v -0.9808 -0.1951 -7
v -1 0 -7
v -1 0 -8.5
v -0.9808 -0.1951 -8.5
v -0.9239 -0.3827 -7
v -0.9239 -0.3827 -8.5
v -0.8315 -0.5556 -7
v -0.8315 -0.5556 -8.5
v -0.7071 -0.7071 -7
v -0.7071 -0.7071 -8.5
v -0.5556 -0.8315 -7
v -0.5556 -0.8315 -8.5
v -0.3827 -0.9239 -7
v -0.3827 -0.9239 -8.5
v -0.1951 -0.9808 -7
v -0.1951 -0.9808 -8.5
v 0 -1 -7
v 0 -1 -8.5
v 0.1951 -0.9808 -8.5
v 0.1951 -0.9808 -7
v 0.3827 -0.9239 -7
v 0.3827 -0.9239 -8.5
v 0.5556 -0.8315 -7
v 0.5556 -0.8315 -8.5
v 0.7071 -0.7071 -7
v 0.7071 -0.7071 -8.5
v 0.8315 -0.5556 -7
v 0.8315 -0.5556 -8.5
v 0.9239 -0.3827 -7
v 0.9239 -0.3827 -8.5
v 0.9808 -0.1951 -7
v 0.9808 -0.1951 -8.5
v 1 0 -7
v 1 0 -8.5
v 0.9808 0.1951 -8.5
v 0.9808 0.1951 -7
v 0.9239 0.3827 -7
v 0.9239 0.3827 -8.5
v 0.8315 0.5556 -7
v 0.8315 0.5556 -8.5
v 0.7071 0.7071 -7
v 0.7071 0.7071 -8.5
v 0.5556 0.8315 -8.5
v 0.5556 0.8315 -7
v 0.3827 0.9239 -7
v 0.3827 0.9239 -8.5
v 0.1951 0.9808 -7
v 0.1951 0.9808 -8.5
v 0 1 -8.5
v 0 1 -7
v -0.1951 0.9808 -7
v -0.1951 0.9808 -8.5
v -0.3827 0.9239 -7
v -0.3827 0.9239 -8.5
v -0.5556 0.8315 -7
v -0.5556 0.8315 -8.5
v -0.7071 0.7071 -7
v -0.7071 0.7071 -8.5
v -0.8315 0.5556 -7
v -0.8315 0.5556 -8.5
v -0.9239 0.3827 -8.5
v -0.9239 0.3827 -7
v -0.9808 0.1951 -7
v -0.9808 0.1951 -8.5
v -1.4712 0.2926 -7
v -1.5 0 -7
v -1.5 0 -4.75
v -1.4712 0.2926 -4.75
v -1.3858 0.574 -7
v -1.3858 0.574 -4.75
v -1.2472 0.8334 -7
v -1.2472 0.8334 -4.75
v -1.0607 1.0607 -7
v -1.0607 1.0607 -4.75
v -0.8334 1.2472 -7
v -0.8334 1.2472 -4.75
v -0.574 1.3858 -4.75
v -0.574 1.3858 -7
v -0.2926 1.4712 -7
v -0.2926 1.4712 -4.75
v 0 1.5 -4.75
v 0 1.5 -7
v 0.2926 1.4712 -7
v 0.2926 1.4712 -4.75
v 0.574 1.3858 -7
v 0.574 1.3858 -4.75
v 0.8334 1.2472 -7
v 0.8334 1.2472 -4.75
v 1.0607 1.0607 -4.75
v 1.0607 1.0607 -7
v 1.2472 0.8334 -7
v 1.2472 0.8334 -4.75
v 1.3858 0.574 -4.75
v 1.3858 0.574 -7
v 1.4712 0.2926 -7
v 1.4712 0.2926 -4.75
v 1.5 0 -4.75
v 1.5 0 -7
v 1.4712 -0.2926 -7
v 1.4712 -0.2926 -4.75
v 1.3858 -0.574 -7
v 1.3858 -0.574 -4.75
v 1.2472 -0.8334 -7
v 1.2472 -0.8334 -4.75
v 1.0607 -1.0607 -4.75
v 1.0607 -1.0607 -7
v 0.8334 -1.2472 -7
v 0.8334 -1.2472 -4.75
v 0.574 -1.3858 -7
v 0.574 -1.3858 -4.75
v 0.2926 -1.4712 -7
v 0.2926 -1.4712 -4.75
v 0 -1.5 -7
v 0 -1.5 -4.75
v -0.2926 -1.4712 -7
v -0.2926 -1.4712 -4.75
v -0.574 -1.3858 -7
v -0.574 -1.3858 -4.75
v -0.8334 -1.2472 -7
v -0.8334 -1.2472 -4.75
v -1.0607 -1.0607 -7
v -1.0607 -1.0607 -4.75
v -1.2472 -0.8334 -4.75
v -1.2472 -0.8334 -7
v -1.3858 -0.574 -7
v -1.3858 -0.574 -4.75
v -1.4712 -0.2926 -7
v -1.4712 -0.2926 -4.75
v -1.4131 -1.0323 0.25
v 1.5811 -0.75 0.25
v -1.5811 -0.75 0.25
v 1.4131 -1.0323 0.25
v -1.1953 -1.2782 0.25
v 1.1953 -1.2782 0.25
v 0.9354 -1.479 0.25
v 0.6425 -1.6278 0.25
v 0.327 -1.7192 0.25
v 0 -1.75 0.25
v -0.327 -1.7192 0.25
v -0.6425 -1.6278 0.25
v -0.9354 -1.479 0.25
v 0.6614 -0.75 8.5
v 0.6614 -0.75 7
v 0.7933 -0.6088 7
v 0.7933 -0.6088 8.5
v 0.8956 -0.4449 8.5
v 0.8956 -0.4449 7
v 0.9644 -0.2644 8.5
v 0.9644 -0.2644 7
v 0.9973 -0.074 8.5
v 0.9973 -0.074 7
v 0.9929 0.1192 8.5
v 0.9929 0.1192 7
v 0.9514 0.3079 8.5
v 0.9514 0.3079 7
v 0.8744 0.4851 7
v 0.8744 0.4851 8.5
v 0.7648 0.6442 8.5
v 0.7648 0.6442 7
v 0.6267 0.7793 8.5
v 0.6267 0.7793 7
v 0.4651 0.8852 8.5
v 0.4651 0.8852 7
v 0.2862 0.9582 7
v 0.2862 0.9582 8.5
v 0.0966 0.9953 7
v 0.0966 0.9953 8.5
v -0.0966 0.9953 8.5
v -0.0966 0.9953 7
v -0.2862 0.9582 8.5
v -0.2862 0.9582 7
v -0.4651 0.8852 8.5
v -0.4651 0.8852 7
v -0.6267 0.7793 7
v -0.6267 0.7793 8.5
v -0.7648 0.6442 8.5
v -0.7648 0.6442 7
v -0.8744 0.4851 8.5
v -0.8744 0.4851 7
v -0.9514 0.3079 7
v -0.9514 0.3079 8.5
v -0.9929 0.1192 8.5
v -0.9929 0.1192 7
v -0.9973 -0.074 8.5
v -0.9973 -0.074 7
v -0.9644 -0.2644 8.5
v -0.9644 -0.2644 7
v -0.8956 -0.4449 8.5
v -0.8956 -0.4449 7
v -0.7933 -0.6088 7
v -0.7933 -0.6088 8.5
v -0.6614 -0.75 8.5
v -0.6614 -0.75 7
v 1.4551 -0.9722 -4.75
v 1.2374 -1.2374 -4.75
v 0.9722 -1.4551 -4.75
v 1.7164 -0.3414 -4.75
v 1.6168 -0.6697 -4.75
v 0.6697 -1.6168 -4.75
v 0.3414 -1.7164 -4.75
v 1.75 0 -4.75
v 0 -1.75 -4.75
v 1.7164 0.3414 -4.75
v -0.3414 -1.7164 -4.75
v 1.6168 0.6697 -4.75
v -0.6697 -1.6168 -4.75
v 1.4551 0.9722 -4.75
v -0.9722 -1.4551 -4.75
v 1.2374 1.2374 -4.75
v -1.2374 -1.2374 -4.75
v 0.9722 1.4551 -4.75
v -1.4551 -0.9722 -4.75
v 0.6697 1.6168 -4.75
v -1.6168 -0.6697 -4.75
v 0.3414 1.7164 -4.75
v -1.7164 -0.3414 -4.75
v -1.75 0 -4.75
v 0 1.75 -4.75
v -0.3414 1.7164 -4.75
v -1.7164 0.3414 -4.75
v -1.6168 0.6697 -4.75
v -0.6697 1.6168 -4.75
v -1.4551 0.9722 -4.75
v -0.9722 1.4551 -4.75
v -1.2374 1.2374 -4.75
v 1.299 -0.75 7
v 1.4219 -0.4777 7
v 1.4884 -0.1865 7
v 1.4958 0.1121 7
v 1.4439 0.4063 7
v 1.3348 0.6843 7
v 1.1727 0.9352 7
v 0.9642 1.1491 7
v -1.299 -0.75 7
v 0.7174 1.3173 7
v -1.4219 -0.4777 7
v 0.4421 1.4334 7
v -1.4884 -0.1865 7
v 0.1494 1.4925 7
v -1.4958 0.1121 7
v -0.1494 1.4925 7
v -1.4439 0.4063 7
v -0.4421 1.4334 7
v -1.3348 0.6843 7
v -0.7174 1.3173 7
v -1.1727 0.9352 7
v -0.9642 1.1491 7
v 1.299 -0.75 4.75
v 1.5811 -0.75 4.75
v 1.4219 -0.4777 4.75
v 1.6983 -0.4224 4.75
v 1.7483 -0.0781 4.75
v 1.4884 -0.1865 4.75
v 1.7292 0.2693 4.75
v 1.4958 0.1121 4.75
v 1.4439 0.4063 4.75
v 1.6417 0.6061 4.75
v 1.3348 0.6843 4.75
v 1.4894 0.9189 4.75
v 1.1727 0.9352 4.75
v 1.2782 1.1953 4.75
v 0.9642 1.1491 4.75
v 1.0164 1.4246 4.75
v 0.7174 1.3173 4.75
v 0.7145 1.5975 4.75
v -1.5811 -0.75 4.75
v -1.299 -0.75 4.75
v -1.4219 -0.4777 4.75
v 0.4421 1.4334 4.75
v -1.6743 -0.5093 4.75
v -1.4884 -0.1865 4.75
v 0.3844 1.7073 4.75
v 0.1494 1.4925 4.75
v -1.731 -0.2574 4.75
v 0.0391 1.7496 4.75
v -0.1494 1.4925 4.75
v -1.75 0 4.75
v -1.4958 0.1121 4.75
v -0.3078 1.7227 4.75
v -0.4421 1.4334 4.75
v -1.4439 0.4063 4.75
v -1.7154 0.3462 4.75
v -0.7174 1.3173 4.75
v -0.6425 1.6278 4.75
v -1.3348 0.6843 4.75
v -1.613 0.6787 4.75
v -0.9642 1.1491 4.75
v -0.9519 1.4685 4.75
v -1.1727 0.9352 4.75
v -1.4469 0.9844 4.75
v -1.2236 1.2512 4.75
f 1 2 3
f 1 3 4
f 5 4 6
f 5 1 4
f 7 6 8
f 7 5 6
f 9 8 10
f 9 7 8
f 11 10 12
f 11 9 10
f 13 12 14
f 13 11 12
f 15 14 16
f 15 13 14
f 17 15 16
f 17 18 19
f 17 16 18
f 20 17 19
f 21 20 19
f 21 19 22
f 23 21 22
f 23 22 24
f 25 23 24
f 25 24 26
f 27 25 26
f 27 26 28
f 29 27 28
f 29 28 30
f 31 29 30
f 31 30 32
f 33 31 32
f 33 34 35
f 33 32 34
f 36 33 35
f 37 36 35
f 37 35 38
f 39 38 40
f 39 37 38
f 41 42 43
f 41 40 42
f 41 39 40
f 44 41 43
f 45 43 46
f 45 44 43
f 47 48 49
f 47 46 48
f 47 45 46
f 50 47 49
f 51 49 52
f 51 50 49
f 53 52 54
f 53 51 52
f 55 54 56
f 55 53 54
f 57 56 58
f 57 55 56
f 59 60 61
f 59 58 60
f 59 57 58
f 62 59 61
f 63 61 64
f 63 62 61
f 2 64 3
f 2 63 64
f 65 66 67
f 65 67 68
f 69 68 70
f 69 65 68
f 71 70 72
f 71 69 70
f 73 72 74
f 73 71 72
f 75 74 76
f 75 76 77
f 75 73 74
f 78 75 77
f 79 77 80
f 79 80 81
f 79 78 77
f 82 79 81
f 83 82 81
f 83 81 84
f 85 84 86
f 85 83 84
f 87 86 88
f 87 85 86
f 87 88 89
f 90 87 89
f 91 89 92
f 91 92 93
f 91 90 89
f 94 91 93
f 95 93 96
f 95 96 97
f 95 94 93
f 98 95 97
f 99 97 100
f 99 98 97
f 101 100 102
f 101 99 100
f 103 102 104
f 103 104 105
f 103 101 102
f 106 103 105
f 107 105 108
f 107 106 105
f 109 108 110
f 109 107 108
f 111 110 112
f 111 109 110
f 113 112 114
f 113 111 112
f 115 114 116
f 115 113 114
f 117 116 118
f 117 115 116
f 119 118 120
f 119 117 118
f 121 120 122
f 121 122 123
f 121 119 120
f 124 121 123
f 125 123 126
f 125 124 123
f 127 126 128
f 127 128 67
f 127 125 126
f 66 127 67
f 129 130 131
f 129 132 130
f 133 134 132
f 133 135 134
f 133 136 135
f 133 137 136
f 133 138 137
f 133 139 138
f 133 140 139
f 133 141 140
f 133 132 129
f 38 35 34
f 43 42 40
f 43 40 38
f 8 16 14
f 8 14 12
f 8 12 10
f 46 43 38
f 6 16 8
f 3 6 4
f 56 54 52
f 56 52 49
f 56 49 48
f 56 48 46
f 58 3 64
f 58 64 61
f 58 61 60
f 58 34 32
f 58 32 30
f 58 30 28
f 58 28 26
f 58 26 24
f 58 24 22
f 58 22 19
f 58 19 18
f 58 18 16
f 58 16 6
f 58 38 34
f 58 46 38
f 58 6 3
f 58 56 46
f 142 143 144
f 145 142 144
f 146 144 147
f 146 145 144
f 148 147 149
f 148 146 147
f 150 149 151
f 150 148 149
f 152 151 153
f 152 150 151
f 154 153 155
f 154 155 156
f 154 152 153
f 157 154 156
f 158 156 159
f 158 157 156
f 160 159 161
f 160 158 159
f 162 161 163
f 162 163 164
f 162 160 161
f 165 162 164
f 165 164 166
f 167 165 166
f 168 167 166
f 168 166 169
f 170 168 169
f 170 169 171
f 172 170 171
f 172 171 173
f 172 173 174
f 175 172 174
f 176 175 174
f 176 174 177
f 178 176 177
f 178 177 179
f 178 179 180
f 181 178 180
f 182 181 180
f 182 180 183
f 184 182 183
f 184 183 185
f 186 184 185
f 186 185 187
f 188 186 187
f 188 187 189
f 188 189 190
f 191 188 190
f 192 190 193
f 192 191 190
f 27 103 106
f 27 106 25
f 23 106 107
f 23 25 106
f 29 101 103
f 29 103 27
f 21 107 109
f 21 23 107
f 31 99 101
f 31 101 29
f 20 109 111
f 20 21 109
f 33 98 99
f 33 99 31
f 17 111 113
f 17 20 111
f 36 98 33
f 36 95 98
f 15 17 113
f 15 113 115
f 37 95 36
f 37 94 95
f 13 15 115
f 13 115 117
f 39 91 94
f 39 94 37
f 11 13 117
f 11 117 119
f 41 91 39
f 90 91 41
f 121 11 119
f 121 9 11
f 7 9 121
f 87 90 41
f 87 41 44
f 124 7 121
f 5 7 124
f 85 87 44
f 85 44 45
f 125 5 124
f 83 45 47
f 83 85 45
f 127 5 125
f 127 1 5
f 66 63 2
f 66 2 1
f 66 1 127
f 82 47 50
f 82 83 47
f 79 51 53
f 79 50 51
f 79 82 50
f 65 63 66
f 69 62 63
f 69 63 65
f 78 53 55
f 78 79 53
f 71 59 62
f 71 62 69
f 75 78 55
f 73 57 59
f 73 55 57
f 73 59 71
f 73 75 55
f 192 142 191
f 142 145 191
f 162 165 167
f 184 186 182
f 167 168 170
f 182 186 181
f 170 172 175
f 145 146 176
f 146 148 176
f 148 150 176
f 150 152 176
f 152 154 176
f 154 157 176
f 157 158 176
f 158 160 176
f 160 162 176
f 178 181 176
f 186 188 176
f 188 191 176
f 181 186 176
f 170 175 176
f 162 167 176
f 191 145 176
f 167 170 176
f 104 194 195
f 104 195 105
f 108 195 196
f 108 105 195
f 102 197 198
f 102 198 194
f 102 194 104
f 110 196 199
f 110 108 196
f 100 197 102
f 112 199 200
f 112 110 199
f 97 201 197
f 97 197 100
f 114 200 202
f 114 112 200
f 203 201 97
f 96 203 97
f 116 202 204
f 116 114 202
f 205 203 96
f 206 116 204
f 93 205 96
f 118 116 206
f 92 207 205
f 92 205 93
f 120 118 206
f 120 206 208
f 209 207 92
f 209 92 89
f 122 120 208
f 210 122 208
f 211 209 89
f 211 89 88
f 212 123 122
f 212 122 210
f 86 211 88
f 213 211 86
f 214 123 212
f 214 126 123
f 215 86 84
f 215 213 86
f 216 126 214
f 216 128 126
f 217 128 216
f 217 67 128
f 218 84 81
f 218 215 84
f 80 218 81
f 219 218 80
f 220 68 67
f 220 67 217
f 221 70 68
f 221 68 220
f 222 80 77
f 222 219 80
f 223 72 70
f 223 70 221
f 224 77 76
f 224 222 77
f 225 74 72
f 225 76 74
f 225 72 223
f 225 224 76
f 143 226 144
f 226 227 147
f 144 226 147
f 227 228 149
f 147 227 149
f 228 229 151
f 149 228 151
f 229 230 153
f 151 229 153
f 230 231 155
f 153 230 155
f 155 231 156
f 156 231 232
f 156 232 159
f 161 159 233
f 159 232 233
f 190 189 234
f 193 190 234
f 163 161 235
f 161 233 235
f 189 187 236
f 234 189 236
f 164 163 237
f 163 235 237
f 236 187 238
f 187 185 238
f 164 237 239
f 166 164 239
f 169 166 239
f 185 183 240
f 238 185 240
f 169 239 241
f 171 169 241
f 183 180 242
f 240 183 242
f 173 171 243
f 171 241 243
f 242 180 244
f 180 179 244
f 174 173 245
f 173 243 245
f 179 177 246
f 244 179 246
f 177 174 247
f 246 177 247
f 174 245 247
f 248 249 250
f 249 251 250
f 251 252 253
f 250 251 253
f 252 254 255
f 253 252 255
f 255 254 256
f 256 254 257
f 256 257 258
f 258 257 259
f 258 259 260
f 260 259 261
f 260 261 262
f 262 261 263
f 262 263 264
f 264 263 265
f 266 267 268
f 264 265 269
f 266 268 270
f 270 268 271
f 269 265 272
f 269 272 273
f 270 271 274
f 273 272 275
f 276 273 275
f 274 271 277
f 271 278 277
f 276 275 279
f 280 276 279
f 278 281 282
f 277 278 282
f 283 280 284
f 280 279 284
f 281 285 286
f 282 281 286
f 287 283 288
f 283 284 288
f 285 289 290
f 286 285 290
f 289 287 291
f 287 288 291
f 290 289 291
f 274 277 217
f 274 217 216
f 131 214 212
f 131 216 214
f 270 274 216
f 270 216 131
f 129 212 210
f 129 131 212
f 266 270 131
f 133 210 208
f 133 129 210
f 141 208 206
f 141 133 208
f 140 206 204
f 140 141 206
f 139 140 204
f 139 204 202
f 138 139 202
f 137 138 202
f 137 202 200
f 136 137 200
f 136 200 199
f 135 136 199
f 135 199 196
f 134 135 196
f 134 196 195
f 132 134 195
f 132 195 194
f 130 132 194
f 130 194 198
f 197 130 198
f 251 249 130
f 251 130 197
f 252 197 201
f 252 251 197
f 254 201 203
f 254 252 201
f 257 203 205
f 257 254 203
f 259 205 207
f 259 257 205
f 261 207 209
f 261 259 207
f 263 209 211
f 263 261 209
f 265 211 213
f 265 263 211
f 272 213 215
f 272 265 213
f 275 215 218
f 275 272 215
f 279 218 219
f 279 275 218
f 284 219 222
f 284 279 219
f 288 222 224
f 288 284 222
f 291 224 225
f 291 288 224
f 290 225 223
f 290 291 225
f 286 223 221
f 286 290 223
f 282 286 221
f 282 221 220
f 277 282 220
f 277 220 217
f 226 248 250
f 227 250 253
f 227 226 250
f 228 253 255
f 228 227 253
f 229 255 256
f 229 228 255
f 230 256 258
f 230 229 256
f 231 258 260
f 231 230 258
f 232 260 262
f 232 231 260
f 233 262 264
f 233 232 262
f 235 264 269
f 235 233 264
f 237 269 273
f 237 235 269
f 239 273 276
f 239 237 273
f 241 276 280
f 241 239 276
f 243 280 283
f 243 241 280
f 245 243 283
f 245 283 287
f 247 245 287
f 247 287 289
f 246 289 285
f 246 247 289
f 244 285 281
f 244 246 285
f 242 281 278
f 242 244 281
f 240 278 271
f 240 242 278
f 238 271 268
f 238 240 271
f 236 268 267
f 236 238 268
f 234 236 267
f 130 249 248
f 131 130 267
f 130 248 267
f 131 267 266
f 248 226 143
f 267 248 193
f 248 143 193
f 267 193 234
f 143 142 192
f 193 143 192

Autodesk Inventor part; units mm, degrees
ref_plane "YZ Plane" through (0, 0, 0) normal (1, 0, 0) x (0, 1, 0)
ref_plane "XY Plane" through (0, 0, 0) normal (0, 0, 1) x (1, 0, 0)
sketch "Sketch1" plane through (0, 0, 0) normal (0, 1, 0) x (-1, 0, 0)
  line L0 (0, 18.1135) -> (0, -15.5197) construction
  line L1 (0, 0) -> (5.9379, 0) construction
  line L2 (0, -8.5) -> (1, -8.5)
  line L3 (1, -8.5) -> (1, -7)
  line L4 (1, -7) -> (1.1561, -7)
  line L5 (1.5, -4.75) -> (1.75, -4.75)
  line L6 (1.75, -4.75) -> (1.75, 4.75)
  line L7 (1.75, 4.75) -> (1.5, 4.75)
  line L8 (1.5, 4.75) -> (1.5, 7)
  line L9 (1.5, 7) -> (1, 7)
  line L10 (1, 7) -> (1, 8.5)
  line L11 (1, 8.5) -> (0, 8.5)
  line L12 (0, -8.5) -> (0, 8.5)
  line L13 (1.5, -4.75) -> (1.5, -7)
  line L14 (1.5, -7) -> (1.1561, -7)
  dimension "d7" = 17
  dimension "d9" = 1
  dimension "d10" = 1.5
  dimension "d11" = 14
  dimension "d12" = 1.75
  dimension "d13" = 9.5
revolve "Revolution1" add sketch "Sketch1" angle 360 about axis through (0, 0, 18.1135) along (0, 0, -1)
ref_plane "Work Plane1" through (0, -1.75, 0) normal (0, 1, 0) x (-1, 0, 0)
sketch "Sketch2" plane through (0, -1.75, 0) normal (0, 1, 0) x (-1, 0, 0)
  line L0 (-1.75, -4.75) -> (1.75, -4.75) projected
  line L1 (-1.75, 4.75) -> (1.75, 4.75) projected
  line L2 (-1.75, -4.75) -> (1.75, -4.75) projected
  line L3 (-1.75, 4.75) -> (-1.75, -4.75) projected
  line L4 (1.75, 4.75) -> (1.75, -4.75) projected
  line L5 (-1.75, 0.25) -> (1.75, 0.25)
  line L6 (1.75, 0.25) -> (1.75, 8.5)
  line L7 (-1.75, 8.5) -> (-1.75, 0.25)
  line L8 (-1.5, 7) -> (1.5, 7) projected
  line L9 (-1.5, 4.75) -> (1.5, 4.75) projected
  line L10 (-1, 8.5) -> (1, 8.5) projected
  line L11 (-1.75, 8.5) -> (1.75, 8.5)
  dimension "d17" = 4.5
extrude "Extrusion1" cut sketch "Sketch2" along normal blind 1 contours L3 L1 L4 L5 | L7 L11 L10 L6 L1
properties part number "2nd_phalanx_shaft"
